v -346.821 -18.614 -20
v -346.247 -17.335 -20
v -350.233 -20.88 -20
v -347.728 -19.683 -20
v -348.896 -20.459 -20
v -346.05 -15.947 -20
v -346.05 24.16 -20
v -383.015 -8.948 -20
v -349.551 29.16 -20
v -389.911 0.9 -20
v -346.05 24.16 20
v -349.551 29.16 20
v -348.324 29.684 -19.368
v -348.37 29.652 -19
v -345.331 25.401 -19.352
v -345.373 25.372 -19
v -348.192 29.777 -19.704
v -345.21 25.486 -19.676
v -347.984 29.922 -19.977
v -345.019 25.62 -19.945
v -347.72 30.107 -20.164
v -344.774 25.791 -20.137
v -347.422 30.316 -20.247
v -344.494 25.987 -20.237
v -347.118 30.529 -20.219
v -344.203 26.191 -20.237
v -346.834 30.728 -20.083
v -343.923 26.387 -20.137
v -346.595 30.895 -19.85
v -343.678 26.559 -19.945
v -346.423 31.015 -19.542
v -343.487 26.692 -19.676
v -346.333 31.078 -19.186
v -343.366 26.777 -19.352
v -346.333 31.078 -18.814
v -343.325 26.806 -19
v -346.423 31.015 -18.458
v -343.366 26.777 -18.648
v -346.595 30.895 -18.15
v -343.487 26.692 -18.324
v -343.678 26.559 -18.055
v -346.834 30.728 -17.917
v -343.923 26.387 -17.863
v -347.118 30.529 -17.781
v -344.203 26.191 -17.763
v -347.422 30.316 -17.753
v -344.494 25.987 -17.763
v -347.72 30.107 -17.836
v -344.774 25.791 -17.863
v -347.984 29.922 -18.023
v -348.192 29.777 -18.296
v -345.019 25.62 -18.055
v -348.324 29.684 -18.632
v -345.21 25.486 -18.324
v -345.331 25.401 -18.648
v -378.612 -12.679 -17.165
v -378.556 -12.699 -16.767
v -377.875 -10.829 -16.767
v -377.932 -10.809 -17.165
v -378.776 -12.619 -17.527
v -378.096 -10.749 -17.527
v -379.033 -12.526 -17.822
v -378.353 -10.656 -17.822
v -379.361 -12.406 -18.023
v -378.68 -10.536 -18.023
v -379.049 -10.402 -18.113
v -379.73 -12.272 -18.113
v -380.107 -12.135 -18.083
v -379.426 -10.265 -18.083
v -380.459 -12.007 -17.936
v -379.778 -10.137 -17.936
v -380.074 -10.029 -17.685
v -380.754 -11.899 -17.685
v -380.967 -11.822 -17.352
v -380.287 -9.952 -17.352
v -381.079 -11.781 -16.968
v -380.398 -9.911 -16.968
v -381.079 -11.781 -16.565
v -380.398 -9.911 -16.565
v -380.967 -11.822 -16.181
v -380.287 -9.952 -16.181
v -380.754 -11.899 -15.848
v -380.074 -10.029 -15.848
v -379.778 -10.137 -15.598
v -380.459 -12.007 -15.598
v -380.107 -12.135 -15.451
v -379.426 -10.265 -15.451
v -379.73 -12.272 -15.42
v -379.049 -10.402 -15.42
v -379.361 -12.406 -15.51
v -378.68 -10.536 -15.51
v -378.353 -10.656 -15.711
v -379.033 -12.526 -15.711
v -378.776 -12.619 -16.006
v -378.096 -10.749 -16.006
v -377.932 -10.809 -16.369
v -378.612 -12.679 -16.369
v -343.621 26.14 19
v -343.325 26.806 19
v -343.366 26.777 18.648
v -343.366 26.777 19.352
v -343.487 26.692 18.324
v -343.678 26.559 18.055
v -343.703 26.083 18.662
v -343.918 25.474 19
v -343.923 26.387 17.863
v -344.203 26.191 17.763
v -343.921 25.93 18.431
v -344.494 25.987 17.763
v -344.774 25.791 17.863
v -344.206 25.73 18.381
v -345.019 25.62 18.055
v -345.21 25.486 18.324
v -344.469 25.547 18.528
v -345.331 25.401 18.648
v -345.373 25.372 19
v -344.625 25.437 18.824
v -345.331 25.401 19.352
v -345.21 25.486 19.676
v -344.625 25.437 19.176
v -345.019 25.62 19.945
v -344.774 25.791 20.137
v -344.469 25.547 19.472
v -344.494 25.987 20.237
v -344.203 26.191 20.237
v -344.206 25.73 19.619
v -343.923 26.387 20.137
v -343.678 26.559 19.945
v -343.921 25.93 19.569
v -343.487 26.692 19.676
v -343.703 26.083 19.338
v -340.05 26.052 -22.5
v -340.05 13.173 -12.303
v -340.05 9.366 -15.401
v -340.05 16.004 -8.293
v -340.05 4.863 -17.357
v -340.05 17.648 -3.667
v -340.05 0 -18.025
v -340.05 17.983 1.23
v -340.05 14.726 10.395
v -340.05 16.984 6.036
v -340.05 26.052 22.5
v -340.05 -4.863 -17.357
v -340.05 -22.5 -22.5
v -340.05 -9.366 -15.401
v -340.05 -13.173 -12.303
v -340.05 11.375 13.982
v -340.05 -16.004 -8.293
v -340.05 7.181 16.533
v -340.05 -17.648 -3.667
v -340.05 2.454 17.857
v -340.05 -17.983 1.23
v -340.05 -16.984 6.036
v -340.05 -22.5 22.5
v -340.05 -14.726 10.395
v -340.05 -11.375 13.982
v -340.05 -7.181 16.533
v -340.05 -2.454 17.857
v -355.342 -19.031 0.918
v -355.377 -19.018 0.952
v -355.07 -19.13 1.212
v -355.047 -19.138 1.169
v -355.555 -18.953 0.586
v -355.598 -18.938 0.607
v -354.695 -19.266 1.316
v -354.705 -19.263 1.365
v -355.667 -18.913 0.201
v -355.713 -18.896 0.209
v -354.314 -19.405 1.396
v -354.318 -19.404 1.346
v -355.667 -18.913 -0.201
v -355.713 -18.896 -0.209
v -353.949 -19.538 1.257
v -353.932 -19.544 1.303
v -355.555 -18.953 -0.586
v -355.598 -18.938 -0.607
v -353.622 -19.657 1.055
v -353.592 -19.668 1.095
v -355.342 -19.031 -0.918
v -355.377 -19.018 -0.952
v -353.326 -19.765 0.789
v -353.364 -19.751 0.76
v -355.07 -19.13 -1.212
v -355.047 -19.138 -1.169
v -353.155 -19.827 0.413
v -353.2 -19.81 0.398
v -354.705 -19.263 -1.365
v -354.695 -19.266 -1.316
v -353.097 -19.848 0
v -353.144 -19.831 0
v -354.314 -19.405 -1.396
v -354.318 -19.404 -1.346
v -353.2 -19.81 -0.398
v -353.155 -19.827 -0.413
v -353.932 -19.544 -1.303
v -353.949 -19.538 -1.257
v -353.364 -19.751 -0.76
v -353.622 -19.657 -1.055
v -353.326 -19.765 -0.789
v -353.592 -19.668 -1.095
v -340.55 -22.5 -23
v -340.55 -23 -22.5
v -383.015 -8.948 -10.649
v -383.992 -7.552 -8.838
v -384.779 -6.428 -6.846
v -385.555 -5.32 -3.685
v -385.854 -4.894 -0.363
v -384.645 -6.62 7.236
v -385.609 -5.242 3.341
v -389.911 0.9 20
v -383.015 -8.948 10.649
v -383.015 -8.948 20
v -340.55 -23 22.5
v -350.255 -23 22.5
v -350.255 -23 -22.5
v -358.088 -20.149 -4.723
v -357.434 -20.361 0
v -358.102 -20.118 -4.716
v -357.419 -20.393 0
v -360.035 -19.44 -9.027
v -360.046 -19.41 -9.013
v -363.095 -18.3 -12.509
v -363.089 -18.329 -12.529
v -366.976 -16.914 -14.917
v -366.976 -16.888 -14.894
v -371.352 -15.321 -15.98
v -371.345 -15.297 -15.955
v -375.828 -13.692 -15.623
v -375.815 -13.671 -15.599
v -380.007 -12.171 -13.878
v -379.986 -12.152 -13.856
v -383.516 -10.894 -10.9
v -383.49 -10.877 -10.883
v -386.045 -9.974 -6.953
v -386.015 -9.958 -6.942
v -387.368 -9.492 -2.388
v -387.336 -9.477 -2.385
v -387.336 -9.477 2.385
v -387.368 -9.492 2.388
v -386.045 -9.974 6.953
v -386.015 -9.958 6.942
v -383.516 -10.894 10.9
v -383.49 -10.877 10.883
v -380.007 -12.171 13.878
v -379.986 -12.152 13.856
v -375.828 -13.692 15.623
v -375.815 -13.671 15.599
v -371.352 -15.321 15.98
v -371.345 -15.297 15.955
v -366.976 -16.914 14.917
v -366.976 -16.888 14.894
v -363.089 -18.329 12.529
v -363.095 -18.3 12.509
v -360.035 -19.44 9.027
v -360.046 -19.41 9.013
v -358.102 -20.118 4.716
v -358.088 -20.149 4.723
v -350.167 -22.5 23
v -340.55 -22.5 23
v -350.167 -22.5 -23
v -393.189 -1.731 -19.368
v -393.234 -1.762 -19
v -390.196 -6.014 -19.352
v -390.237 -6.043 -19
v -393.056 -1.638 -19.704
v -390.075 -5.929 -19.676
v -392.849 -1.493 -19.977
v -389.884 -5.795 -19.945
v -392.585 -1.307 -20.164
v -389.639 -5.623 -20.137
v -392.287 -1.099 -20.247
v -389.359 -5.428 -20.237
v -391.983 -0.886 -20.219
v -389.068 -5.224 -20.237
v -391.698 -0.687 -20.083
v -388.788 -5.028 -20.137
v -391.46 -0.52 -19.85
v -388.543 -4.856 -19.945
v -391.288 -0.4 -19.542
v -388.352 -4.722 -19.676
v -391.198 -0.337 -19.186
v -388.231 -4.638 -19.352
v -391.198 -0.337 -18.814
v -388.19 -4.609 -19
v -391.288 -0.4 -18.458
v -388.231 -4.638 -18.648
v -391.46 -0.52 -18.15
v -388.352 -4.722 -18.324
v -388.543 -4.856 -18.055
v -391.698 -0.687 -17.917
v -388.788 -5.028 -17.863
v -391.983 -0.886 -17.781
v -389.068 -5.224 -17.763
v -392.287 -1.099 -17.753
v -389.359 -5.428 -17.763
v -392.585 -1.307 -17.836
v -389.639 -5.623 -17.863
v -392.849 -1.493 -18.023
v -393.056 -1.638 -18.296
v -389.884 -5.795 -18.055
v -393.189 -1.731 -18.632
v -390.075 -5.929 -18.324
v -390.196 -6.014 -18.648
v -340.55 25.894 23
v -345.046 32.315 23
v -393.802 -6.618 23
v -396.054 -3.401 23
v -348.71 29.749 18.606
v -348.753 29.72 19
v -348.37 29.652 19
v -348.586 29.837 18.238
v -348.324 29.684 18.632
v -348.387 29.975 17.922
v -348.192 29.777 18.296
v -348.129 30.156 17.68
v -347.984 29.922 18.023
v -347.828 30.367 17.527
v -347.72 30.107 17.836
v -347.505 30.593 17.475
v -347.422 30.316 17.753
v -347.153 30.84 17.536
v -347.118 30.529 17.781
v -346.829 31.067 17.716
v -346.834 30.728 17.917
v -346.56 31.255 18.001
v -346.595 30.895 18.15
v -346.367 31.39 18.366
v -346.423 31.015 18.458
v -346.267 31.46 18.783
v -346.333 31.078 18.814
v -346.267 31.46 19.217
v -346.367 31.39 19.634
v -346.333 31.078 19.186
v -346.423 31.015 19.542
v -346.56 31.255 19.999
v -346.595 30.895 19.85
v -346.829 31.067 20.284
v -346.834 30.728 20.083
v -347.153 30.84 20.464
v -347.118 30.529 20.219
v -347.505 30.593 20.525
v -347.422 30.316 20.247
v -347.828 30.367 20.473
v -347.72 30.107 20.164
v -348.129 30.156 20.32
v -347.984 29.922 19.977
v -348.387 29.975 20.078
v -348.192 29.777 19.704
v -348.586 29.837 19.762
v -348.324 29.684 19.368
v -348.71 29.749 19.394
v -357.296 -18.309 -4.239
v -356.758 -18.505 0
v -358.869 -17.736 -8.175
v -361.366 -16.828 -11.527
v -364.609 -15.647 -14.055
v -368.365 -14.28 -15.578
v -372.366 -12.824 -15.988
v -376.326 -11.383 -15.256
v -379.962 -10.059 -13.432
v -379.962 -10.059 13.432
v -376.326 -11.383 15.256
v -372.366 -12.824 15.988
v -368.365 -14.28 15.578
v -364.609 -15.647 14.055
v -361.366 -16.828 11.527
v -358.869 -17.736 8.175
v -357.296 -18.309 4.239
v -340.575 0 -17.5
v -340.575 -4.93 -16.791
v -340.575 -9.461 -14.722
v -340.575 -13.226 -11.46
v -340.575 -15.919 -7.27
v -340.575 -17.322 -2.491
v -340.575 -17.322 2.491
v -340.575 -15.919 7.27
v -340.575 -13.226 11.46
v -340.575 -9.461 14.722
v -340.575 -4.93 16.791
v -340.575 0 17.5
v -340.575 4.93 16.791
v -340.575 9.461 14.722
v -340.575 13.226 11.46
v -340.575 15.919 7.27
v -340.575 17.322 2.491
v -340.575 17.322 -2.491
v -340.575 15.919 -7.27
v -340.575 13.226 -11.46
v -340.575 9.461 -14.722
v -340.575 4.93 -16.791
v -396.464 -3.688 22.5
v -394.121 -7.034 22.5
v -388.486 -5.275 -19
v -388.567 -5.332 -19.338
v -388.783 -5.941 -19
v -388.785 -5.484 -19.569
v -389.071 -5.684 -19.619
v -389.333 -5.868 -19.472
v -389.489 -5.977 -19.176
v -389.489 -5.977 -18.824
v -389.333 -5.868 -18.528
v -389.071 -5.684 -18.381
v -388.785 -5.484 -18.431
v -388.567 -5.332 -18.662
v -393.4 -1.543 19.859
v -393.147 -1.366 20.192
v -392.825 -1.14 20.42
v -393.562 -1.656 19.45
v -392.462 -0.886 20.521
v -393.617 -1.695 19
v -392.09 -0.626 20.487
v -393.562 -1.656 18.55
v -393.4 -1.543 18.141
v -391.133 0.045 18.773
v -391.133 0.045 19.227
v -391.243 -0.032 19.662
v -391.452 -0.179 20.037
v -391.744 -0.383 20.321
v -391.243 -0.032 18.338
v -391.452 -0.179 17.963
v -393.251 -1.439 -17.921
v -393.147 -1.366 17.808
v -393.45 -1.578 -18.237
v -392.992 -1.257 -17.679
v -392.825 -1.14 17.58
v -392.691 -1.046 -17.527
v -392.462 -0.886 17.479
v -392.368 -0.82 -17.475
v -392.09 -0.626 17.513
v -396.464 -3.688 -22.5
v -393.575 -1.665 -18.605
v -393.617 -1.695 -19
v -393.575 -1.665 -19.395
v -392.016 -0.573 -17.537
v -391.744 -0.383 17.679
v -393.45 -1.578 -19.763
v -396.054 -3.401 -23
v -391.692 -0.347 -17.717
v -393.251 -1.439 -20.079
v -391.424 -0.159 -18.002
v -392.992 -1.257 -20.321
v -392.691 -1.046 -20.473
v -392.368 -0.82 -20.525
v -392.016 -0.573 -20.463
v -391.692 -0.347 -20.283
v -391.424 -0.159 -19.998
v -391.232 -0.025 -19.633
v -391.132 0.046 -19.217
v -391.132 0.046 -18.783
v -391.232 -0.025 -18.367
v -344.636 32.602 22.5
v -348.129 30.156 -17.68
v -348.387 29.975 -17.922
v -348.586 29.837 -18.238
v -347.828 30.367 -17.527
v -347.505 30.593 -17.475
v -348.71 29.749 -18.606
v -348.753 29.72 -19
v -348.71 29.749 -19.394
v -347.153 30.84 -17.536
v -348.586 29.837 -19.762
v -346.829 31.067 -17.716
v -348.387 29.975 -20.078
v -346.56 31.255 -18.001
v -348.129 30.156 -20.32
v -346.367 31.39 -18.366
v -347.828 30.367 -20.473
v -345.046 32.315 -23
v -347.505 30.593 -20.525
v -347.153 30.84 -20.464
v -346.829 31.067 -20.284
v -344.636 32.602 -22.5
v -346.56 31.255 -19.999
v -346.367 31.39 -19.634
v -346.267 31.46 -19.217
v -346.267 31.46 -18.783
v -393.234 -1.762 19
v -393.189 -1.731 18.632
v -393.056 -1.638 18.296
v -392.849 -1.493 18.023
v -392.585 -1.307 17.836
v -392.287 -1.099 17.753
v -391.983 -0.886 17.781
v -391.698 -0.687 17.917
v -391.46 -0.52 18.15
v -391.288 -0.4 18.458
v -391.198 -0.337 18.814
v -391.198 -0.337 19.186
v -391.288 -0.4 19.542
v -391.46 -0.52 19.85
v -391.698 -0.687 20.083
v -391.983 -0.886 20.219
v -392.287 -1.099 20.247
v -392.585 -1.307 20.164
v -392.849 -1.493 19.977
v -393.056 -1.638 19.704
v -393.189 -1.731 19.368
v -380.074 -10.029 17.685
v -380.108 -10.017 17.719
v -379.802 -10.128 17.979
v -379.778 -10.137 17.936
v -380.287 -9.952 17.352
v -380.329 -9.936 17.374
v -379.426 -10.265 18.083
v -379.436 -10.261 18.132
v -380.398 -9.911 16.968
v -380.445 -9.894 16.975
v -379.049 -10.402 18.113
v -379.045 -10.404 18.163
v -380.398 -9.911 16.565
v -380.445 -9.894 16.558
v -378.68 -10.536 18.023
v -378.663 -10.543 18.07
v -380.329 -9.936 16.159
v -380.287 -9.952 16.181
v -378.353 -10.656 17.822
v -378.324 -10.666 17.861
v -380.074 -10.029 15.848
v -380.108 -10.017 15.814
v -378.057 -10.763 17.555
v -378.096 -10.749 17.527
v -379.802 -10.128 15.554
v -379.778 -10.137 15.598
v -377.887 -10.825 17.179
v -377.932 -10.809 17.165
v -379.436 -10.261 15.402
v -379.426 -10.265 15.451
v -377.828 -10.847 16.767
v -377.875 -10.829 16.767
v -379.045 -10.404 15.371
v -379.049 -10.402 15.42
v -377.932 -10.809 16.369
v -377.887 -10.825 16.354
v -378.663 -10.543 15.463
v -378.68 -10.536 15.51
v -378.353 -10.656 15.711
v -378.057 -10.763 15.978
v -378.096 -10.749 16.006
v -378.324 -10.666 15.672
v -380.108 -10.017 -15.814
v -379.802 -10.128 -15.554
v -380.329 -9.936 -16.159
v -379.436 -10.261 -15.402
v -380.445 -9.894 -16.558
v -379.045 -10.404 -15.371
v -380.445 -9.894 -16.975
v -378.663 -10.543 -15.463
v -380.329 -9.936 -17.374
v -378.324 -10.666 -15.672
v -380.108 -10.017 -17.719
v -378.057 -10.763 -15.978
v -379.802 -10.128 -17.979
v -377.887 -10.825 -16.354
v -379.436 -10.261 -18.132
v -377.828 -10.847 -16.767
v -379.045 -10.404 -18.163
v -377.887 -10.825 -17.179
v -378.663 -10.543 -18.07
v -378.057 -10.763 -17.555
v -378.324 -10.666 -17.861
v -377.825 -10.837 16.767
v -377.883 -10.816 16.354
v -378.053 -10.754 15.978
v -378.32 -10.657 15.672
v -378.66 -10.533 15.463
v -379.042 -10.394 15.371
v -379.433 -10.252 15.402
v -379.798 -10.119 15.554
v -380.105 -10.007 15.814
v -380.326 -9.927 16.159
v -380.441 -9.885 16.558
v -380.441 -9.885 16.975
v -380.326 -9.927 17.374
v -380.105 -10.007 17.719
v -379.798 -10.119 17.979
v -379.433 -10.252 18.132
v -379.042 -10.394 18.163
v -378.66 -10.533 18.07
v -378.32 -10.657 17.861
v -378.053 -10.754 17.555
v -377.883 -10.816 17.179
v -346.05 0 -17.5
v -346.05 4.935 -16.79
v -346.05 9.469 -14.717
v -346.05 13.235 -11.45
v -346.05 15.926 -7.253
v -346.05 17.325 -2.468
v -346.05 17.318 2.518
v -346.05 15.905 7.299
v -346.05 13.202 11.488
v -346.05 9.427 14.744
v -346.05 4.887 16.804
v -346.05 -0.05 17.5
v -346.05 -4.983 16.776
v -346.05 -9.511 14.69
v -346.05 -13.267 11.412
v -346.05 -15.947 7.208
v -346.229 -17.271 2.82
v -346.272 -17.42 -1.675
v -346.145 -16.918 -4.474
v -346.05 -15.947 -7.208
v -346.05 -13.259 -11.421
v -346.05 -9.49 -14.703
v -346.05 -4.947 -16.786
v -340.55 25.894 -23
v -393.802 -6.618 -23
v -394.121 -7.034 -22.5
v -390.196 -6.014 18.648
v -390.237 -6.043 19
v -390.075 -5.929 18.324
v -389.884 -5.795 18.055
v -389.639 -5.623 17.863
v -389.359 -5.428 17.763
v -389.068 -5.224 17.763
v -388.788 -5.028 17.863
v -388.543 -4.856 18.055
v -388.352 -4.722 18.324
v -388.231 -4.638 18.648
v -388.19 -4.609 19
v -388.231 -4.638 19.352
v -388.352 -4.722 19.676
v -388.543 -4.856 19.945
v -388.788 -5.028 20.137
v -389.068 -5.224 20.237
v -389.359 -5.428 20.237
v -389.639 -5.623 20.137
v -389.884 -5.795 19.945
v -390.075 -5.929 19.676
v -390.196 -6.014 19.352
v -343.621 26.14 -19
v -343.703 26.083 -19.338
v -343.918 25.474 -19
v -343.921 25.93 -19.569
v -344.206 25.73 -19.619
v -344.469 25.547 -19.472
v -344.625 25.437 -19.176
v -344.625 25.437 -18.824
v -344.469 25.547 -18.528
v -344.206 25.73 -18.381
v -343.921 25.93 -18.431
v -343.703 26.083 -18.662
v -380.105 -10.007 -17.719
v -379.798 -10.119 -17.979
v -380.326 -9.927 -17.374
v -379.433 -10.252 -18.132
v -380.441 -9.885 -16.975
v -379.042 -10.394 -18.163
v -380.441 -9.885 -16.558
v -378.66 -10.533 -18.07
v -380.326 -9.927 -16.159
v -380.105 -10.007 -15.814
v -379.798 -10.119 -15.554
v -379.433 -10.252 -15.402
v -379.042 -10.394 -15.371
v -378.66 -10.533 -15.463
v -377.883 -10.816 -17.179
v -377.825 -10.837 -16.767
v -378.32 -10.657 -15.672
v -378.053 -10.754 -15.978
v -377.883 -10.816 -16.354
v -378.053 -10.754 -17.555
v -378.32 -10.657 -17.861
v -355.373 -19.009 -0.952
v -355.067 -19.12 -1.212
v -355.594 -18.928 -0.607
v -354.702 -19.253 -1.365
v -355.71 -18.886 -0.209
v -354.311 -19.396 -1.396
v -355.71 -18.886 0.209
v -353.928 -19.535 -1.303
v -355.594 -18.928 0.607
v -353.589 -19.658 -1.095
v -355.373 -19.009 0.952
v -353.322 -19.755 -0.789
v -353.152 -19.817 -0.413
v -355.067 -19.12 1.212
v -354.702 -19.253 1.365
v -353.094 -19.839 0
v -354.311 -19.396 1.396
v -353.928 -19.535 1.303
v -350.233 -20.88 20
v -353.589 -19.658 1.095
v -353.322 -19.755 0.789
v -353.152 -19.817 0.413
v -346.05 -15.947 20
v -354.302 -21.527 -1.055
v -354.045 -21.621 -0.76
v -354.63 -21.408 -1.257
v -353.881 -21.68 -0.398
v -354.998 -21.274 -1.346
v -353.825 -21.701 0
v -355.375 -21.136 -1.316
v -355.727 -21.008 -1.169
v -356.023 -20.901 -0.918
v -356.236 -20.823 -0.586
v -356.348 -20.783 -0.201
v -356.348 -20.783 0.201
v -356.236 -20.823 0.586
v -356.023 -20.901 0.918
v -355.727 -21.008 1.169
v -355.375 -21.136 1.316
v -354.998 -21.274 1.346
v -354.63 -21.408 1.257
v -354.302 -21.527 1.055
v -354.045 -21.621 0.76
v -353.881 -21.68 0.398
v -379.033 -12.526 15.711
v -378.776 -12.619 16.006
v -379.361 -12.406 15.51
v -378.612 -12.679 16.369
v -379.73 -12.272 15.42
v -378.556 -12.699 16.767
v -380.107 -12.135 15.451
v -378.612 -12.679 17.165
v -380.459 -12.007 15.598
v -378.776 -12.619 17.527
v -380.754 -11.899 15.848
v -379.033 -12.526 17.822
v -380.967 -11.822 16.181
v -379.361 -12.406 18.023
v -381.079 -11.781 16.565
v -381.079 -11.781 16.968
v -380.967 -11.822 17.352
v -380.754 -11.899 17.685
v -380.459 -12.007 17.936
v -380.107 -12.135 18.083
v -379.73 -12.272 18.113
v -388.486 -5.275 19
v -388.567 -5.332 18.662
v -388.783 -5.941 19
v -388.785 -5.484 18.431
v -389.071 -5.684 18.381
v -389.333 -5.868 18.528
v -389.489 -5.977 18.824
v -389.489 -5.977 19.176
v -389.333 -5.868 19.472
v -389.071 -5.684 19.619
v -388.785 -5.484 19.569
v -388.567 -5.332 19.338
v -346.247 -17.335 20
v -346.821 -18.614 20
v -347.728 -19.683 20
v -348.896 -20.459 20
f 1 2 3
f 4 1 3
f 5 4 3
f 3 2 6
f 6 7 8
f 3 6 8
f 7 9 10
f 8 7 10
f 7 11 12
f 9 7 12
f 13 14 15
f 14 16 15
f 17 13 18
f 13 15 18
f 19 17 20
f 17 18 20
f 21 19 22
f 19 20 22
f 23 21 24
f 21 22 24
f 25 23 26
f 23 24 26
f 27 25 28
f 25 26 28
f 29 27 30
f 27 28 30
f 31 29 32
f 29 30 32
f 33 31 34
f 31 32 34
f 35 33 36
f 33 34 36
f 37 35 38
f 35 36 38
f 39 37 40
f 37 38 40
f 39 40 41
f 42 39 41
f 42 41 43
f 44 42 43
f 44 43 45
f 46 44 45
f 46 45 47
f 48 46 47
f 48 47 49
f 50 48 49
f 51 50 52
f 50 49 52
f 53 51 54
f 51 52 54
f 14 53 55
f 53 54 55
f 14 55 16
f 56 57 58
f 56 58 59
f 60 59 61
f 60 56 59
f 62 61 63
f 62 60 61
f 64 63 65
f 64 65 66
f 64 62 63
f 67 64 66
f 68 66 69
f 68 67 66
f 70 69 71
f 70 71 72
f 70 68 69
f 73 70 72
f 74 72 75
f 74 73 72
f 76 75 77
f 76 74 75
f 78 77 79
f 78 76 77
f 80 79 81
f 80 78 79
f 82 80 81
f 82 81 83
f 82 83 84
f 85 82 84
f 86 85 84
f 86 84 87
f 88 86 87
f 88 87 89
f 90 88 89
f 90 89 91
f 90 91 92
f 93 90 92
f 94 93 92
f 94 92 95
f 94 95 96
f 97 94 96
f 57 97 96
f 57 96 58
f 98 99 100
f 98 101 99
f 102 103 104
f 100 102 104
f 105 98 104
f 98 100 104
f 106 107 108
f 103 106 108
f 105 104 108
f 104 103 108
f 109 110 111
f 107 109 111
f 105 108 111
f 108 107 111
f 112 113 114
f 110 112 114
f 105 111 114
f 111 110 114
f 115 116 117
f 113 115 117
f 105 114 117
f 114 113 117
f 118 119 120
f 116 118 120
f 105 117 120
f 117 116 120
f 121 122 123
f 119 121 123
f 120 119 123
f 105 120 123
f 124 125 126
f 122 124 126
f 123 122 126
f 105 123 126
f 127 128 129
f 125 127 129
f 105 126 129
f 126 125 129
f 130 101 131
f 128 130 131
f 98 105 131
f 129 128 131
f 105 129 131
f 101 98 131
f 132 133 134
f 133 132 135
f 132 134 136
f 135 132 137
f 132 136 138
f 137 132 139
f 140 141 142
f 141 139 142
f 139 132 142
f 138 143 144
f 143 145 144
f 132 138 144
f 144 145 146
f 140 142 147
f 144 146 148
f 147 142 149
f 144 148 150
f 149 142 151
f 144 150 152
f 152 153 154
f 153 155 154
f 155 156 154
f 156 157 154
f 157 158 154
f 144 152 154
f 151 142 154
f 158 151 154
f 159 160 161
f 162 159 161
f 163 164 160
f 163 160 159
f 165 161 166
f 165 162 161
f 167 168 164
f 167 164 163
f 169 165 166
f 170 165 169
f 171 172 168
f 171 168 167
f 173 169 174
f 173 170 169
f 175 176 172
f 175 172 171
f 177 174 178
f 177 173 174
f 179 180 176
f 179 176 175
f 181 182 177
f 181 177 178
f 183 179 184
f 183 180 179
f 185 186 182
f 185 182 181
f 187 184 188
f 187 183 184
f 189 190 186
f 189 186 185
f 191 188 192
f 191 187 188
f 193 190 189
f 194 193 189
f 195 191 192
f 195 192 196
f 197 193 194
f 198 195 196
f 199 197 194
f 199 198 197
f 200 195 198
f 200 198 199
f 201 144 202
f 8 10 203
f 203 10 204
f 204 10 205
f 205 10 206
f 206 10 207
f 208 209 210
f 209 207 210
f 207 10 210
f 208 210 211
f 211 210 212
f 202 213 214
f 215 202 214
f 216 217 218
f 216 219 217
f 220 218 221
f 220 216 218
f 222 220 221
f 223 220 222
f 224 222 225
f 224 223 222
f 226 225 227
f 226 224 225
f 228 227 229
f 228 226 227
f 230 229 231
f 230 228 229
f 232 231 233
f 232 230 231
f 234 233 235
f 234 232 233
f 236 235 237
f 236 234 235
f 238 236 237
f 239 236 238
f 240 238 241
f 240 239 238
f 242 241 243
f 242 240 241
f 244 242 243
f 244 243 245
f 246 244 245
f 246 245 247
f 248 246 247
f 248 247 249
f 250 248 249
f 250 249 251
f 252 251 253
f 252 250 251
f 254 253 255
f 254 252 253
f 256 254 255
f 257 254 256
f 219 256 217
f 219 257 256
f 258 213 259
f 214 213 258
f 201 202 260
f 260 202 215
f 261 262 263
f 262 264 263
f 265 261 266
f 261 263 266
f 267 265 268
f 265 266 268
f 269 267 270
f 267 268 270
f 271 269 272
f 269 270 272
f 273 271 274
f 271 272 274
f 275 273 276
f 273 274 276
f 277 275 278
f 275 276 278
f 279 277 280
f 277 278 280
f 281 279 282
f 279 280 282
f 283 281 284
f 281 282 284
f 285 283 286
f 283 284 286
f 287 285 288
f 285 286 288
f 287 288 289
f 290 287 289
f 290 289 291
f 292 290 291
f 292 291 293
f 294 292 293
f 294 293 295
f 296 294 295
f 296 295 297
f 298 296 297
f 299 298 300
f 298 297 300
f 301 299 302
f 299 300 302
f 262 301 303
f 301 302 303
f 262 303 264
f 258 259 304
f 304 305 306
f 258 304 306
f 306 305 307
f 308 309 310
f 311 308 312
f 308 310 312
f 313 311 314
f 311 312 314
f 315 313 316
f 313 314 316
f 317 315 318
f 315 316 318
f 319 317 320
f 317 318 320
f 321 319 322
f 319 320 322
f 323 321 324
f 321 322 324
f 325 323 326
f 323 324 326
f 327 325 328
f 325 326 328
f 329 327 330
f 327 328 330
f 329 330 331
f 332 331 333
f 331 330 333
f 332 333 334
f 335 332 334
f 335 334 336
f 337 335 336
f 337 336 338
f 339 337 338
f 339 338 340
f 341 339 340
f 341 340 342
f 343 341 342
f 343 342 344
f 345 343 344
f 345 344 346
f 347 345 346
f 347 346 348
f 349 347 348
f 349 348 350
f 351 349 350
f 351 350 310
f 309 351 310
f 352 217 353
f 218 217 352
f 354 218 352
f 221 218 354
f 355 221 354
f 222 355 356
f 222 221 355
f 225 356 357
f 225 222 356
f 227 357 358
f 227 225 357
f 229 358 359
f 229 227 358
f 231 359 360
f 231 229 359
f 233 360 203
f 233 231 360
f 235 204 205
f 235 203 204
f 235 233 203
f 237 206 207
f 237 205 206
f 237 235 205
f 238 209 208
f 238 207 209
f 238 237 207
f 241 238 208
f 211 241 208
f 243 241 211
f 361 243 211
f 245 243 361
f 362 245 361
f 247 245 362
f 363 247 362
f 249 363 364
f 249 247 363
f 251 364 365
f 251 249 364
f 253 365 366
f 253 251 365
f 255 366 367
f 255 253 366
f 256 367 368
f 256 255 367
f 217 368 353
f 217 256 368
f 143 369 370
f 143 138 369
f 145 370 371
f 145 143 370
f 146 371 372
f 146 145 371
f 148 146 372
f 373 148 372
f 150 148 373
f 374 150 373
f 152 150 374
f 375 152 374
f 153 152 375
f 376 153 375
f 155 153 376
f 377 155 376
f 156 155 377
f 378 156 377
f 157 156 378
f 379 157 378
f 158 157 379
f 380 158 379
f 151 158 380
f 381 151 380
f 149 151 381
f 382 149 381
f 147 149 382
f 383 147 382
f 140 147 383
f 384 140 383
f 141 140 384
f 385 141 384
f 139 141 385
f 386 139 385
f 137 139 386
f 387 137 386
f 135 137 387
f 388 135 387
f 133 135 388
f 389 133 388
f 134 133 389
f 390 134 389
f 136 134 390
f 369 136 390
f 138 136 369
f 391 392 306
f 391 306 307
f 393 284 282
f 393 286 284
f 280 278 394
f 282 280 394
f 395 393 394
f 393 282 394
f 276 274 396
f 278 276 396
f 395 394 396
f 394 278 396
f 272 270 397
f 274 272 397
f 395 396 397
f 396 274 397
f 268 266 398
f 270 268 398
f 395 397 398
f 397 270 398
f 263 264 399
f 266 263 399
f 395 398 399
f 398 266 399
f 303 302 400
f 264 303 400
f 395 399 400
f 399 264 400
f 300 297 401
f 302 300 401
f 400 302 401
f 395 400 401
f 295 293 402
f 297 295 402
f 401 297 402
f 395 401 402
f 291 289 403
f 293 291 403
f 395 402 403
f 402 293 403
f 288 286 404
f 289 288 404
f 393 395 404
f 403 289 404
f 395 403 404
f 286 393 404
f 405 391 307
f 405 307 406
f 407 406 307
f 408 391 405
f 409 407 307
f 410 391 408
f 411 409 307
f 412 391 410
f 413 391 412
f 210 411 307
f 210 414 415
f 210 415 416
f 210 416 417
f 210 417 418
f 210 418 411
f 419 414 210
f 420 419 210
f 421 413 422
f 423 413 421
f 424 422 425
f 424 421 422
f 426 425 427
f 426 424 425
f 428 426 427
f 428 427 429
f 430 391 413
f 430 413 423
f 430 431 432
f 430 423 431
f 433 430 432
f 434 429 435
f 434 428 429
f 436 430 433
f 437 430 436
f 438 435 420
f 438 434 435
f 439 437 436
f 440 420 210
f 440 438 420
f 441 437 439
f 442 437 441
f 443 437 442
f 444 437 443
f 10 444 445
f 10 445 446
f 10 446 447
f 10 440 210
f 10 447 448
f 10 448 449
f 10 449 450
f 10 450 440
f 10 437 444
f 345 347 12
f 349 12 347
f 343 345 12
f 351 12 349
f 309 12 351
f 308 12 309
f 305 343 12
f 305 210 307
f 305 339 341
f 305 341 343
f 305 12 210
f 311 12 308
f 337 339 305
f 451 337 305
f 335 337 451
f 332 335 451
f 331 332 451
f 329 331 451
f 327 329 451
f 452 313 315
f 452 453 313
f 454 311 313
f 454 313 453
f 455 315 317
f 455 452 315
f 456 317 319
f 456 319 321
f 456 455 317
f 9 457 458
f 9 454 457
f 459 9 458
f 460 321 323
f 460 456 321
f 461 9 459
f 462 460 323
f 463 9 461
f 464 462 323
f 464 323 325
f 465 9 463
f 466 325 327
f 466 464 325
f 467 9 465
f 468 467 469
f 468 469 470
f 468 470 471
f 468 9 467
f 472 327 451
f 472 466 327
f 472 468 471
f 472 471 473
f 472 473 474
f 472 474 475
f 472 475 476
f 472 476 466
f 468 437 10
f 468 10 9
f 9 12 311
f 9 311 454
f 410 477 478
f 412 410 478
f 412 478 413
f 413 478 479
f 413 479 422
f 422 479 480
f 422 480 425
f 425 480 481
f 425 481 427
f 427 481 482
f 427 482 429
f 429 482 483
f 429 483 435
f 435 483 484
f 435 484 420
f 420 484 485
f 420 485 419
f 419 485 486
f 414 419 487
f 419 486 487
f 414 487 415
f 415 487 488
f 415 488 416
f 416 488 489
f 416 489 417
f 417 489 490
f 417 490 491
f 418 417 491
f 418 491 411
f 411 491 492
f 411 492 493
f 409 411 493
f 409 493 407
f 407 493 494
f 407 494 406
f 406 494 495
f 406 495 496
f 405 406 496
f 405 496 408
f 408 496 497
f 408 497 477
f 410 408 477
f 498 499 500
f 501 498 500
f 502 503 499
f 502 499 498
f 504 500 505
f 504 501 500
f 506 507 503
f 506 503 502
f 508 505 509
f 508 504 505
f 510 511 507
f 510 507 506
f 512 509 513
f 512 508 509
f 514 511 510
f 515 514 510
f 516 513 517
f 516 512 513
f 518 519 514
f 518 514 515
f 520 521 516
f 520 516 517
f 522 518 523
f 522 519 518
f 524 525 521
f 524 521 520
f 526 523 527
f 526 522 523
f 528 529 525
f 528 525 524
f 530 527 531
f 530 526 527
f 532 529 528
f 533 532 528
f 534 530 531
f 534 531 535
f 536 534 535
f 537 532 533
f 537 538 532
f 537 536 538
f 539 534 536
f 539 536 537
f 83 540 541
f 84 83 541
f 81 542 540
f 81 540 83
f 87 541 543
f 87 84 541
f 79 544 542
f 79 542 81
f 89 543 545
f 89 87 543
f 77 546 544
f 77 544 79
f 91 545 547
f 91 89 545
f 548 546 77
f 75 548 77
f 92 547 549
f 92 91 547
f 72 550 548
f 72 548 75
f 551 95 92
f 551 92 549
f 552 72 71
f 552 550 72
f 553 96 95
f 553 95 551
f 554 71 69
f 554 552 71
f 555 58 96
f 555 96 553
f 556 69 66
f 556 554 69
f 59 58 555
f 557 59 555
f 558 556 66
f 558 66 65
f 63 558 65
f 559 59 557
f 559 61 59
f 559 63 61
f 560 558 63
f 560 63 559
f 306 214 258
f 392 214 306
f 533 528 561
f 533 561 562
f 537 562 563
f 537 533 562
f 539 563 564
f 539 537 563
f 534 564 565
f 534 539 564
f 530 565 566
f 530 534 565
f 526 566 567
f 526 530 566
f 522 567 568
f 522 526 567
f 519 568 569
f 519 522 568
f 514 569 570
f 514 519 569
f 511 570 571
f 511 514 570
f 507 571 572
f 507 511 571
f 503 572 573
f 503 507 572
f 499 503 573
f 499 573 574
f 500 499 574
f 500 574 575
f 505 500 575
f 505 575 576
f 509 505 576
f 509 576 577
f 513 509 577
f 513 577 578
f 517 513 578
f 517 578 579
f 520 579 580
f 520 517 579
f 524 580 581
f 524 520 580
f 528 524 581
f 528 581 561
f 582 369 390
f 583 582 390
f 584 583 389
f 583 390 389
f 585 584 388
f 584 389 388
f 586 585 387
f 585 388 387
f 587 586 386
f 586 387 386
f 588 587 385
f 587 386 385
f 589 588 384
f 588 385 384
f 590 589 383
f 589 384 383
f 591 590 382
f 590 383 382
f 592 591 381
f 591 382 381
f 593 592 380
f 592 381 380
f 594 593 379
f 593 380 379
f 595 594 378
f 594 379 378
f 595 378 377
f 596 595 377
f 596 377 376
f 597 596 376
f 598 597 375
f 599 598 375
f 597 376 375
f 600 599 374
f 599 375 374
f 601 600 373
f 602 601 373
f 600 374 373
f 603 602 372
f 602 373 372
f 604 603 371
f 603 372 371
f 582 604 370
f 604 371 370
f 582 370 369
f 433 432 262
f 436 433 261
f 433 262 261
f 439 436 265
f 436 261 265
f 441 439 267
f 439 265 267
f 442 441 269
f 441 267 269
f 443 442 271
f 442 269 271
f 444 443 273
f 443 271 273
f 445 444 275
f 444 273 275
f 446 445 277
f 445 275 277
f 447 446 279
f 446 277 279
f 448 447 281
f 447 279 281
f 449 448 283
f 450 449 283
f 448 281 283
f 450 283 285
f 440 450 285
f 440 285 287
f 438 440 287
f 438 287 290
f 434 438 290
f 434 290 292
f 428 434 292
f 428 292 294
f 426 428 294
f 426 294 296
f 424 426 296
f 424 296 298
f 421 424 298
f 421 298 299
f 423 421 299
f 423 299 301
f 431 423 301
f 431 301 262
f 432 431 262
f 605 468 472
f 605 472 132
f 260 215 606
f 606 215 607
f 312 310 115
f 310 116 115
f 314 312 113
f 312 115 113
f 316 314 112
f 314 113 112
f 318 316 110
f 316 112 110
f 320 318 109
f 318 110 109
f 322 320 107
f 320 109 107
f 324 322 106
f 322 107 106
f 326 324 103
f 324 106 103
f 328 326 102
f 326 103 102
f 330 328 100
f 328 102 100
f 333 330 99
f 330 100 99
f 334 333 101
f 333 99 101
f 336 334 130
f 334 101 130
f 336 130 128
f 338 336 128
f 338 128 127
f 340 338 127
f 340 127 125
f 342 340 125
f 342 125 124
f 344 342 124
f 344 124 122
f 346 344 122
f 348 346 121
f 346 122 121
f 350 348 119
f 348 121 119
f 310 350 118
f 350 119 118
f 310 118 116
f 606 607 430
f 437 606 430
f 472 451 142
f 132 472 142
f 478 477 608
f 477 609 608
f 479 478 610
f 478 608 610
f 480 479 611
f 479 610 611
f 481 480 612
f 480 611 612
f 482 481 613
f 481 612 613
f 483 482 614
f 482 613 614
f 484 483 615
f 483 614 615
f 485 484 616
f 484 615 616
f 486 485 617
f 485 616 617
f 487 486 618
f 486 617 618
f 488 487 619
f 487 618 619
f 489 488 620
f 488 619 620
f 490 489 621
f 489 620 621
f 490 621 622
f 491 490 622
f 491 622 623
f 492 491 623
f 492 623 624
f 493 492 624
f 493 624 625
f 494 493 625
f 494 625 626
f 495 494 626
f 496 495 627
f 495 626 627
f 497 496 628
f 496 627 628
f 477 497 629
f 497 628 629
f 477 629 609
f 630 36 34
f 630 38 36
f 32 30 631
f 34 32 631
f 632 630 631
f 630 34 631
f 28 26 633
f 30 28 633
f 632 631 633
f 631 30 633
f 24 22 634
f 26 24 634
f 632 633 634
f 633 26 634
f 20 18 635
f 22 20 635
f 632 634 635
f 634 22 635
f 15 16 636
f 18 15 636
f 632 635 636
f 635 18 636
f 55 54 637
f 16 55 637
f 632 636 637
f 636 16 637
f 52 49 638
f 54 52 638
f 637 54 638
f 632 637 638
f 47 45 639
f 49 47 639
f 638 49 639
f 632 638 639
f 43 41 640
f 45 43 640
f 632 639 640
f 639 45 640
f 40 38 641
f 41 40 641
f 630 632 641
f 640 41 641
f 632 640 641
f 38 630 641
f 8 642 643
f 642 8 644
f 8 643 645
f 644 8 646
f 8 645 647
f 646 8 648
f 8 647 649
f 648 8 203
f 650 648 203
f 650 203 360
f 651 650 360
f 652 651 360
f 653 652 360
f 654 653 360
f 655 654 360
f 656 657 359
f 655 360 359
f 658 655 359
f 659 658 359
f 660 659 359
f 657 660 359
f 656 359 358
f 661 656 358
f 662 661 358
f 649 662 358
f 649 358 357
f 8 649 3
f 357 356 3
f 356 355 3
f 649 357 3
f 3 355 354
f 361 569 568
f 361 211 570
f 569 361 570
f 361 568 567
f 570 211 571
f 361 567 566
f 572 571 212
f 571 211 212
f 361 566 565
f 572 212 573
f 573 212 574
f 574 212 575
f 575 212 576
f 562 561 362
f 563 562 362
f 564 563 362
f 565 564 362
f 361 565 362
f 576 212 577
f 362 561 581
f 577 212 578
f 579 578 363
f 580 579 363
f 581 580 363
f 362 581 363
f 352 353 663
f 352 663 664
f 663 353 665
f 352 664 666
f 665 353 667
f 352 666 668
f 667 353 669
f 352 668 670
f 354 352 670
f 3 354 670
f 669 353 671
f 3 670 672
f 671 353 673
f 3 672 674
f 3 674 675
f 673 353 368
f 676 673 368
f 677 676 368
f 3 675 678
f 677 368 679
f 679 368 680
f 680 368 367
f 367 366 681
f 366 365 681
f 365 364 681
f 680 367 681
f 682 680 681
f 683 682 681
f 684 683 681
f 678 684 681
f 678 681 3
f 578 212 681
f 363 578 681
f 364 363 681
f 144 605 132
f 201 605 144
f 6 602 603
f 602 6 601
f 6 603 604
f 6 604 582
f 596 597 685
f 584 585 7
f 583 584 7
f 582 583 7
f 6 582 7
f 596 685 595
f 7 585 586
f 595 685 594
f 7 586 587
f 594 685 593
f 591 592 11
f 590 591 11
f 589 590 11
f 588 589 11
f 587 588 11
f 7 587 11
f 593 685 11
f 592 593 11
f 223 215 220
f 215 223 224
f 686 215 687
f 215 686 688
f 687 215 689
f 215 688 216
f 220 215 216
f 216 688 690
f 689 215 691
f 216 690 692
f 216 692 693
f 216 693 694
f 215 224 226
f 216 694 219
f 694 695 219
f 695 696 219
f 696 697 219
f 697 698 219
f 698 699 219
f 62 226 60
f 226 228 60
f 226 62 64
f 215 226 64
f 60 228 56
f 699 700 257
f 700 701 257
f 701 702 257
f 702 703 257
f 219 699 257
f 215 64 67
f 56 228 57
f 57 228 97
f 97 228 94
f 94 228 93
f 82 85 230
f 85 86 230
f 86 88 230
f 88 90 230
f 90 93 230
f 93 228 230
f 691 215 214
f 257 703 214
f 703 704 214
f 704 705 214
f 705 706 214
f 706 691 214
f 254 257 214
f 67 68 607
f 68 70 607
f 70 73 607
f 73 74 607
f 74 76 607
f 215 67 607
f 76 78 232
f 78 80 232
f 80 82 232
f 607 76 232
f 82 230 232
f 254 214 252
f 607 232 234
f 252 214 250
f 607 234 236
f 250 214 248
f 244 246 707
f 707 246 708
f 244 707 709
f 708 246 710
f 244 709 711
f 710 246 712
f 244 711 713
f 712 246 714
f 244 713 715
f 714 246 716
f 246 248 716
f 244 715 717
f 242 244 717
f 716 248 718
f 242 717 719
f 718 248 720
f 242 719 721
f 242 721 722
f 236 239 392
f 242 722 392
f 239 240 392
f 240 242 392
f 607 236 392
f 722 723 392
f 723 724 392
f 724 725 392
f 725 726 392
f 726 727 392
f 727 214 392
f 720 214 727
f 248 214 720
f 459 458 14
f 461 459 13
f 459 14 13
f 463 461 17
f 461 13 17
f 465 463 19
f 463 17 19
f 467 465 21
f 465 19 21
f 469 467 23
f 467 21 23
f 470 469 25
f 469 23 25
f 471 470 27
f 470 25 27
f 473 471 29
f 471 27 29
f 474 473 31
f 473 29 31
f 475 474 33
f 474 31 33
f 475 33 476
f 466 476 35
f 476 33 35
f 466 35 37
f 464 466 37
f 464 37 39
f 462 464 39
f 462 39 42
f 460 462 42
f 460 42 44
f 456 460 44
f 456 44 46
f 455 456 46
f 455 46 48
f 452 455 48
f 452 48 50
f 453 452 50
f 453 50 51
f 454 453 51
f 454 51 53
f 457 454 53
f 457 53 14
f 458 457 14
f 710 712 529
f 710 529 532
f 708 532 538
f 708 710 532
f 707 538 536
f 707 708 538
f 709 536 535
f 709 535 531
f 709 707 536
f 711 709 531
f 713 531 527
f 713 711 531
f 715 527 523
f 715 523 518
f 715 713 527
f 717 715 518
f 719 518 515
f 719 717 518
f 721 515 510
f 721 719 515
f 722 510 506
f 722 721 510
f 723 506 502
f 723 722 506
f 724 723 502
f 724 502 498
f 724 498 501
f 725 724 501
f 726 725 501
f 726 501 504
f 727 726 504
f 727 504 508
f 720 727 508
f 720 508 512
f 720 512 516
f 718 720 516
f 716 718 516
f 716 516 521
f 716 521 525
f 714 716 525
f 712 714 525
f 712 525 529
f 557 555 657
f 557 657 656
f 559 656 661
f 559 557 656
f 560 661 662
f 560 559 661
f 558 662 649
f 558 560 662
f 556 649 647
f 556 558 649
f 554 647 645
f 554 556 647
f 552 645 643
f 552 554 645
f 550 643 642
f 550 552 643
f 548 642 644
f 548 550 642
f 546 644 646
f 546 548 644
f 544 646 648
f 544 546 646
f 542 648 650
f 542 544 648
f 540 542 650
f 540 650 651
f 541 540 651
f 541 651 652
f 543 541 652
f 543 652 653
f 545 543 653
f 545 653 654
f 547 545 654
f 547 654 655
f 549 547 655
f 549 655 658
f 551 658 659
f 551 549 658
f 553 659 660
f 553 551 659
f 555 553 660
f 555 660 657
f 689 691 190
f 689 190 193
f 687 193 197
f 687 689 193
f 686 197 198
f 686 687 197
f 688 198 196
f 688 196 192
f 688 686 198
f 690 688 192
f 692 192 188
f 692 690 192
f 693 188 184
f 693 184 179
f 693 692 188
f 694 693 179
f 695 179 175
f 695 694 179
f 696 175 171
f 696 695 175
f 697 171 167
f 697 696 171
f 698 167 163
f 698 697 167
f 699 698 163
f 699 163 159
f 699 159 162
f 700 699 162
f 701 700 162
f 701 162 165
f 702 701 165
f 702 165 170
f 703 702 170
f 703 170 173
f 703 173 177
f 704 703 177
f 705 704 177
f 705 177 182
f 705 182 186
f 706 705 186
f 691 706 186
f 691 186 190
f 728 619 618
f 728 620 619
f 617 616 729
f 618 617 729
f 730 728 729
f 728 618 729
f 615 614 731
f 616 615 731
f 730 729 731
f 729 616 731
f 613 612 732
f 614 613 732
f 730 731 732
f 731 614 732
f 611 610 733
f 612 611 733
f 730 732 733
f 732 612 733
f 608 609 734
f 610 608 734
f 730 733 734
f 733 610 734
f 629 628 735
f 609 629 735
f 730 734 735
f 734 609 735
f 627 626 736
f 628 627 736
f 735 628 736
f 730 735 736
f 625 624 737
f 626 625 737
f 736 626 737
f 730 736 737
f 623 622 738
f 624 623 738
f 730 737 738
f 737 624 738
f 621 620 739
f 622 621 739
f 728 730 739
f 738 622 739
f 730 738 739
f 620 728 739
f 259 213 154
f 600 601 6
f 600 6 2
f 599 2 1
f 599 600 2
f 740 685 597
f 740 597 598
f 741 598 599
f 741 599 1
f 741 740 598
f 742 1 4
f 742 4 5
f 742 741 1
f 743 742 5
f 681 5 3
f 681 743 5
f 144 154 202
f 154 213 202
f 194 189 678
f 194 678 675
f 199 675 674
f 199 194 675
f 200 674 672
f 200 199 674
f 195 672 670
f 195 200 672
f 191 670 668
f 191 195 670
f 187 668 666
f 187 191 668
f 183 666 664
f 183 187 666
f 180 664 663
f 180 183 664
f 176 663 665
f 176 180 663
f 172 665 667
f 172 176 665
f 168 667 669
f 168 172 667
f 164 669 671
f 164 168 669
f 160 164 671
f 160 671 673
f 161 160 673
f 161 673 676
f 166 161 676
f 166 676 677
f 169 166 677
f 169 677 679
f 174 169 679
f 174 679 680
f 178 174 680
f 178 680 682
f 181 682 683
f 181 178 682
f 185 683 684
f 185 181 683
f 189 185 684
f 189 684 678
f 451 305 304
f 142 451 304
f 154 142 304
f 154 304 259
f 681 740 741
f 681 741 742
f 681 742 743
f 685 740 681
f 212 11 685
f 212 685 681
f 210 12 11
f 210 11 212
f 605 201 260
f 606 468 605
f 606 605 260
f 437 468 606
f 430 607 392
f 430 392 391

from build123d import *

# Parameters (mm, degrees)
P_IDAT_VYSUNUT_M1_DEPTH                     = 20
P_IDAT_VYSUNUT_M2_DEPTH                     = 3
V_LCOV_START                                = -141.407290306
V_LCOV_ZAHLOUBEN_PRO_M2_5_ROUBY_S_2_R       = 1.35
V_LCOV_ZAHLOUBEN_PRO_M2_5_ROUBY_S_VNI_DEPTH = 2
V_LCOV_START_2                              = -139.417290306
V_LCOV_ZAHLOUBEN_PRO_M2_5_ROUBY_S_3_O_R     = 1.4
V_LCOV_ZAHLOUBEN_PRO_M2_5_ROUBY_S_3_O_R_2   = 1.35
V_LCOV_ZAHLOUBEN_PRO_M2_5_ROUBY_S_3_DEPTH   = 0.01
SKICA13_W                                   = 63.2698
SKICA13_H                                   = 46
SKICA13_W_2                                 = 49.2698
SKICA13_H_2                                 = 40
ODEBRAT_VYSUNUT_M1_DEPTH                    = 3
M3_Z_VIT2_D                                 = 2.5
M3_Z_VIT2_DEPTH                             = 5.5
M3_Z_VIT2_CSINK_D                           = 3.05
M3_Z_VIT2_CSINK_ANGLE                       = 90
M3_Z_VIT2_TIP                               = 0.751075774
M3_Z_VIT2_ON_FACE_2_D                       = 2.5
M3_Z_VIT2_ON_FACE_2_DEPTH                   = 5.5
M3_Z_VIT2_ON_FACE_2_CSINK_D                 = 3.05
M3_Z_VIT2_ON_FACE_2_CSINK_ANGLE             = 90
M3_Z_VIT2_ON_FACE_2_TIP                     = 0.751075774
M3_Z_VIT2_ON_FACE_3_D                       = 2.5
M3_Z_VIT2_ON_FACE_3_DEPTH                   = 5.5
M3_Z_VIT2_ON_FACE_3_CSINK_D                 = 3.05
M3_Z_VIT2_ON_FACE_3_CSINK_ANGLE             = 90
M3_Z_VIT2_ON_FACE_3_TIP                     = 0.751075774
ZKOSEN_1_SIZE                               = 0.5
ZAOBLIT1_R                                  = 5


# Read off the part's stored shape, not the designer's step: Válcové zahloubení pro M2.5 šrouby s vnitřním šestihranem1
with BuildPart() as part:
    # Skica2 → Přidat vysunutím1 (new, symmetric)
    with BuildSketch(Plane.XY):
        Polygon((-340.05, -23), (-350.255276964, -23), (-394.120989631, -7.034186284), (-398.184656118, -1.23066909), (-391.631439764, 3.357942401), (-383.014556922, -8.948241654), (-350.233285651, -20.879648638), (-346.05, -20.879648638), (-346.05, 24.160174988), (-351.271982372, 31.617938704), (-346.357070106, 35.059397322), (-340.05, 26.051967722), align=None)
    extrude(amount=P_IDAT_VYSUNUT_M1_DEPTH, both=True)

    # Skica3 → Přidat vysunutím2 (add)
    with BuildSketch(Plane.XY.offset(20)):
        Polygon((-346.357070106, 35.059397322), (-340.05, 26.051967722), (-340.05, -23), (-350.255276964, -23), (-394.120989631, -7.034186284), (-398.184656118, -1.23066909), align=None)
    p_idat_vysunut_m2 = extrude(amount=P_IDAT_VYSUNUT_M2_DEPTH)

    # Zrcadlit1: Přidat vysunutím2 across plane
    add(p_idat_vysunut_m2.mirror(Plane.XY))

    # Skica6 → M36x1.0 závit1 (revolve, cut)
    with BuildSketch(Plane(origin=(-340.05, 0, 0), x_dir=(0, 0, -1), z_dir=(0, 1, 0))):
        Polygon((0, 0), (0, 6), (17.5, 6), (17.5, 0.525), (18.025, 0), align=None)
    revolve(axis=Axis((-333.7, 0, 0), (-1, 0, 0)), mode=Mode.SUBTRACT)

    # Skica8 → Ø32.0 (32) průměr díry1 (revolve, cut)
    with BuildSketch(Plane(origin=(-372.477448122, -14.911791158, 0), x_dir=(0.9396926207859314, -0.34202014332560576, 0), z_dir=(0, 0, 1))):
        Polygon((0, 0), (0, 15.613769904), (16, 6), (16, 0.025), (16.025, 0), align=None)
    revolve(axis=Axis((-374.649276032, -20.8788393, 0), (0.3420201433256057, 0.9396926207859314, 0)), mode=Mode.SUBTRACT)

    # V_lcov_ zahlouben_ pro M2.5 _rouby s 2 → Válcové zahloubení pro M2.5 šrouby s vnitřním šestihranem1 (cut)
    with BuildSketch(Plane(origin=(0, 0, 0), x_dir=(0.9396926207859079, -0.34202014332566993, 0), z_dir=(0.34202014332567, 0.939692620785908, 0)).offset(V_LCOV_START)):
        with Locations((-352.732614303, 16.76669406)):
            Circle(V_LCOV_ZAHLOUBEN_PRO_M2_5_ROUBY_S_2_R)
        with Locations((-352.732614303, -16.76669406)):
            Circle(V_LCOV_ZAHLOUBEN_PRO_M2_5_ROUBY_S_2_R)
        with Locations((-326.41417646, 0)):
            Circle(V_LCOV_ZAHLOUBEN_PRO_M2_5_ROUBY_S_2_R)
    extrude(amount=V_LCOV_ZAHLOUBEN_PRO_M2_5_ROUBY_S_VNI_DEPTH, mode=Mode.SUBTRACT)

    # V_lcov_ zahlouben_ pro M2.5 _rouby s 3 o → V_lcov_ zahlouben_ pro M2.5 _rouby s 3 (cut)
    # profile 1 of 3: a face of its own
    with BuildSketch(Plane(origin=(0, 0, 0), x_dir=(0.9396926207859079, -0.34202014332566993, 0), z_dir=(0.34202014332567, 0.939692620785908, 0)).offset(V_LCOV_START_2)):
        with Locations((-352.732614303, 16.76669406)):
            Circle(V_LCOV_ZAHLOUBEN_PRO_M2_5_ROUBY_S_3_O_R)
        with Locations((-352.732614303, 16.76669406)):
            Circle(V_LCOV_ZAHLOUBEN_PRO_M2_5_ROUBY_S_3_O_R_2, mode=Mode.SUBTRACT)
    # profile 2 of 3: a face of its own
    with BuildSketch(Plane(origin=(0, 0, 0), x_dir=(0.9396926207859079, -0.34202014332566993, 0), z_dir=(0.34202014332567, 0.939692620785908, 0)).offset(V_LCOV_START_2)):
        with Locations((-352.732614303, -16.76669406)):
            Circle(V_LCOV_ZAHLOUBEN_PRO_M2_5_ROUBY_S_3_O_R)
        with Locations((-352.732614303, -16.76669406)):
            Circle(V_LCOV_ZAHLOUBEN_PRO_M2_5_ROUBY_S_3_O_R_2, mode=Mode.SUBTRACT)
    # profile 3 of 3: a face of its own
    with BuildSketch(Plane(origin=(0, 0, 0), x_dir=(0.9396926207859079, -0.34202014332566993, 0), z_dir=(0.34202014332567, 0.939692620785908, 0)).offset(V_LCOV_START_2)):
        with Locations((-326.41417646, 0)):
            Circle(V_LCOV_ZAHLOUBEN_PRO_M2_5_ROUBY_S_3_O_R)
        with Locations((-326.41417646, 0)):
            Circle(V_LCOV_ZAHLOUBEN_PRO_M2_5_ROUBY_S_3_O_R_2, mode=Mode.SUBTRACT)
    extrude(amount=V_LCOV_ZAHLOUBEN_PRO_M2_5_ROUBY_S_3_DEPTH, mode=Mode.SUBTRACT)

    # Skica13 → Odebrat vysunutím1 (cut)
    with BuildSketch(Plane(origin=(-130.42051615, 186.259800178, 0), x_dir=(0.8191520442889952, 0.5735764363510412, 0), z_dir=(-0.5735764363510412, 0.8191520442889952, 0))):
        with Locations((-295.244757855, 0)):
            Rectangle(SKICA13_W, SKICA13_H)
        with Locations((-294.244757855, 0)):
            Rectangle(SKICA13_W_2, SKICA13_H_2, mode=Mode.SUBTRACT)
    extrude(amount=-ODEBRAT_VYSUNUT_M1_DEPTH, mode=Mode.SUBTRACT)

    # M3 závit2
    with Locations(Plane(origin=(-392.368166588, -0.820243041, 19), x_dir=(0.819152044289, 0.573576436351, 0), z_dir=(-0.573576436351, 0.819152044289, 0))):
        with Locations((0, 0)):
            CounterSinkHole(M3_Z_VIT2_D / 2, M3_Z_VIT2_CSINK_D / 2, depth=M3_Z_VIT2_DEPTH, counter_sink_angle=M3_Z_VIT2_CSINK_ANGLE)
            with Locations((0, 0, -(M3_Z_VIT2_DEPTH + M3_Z_VIT2_TIP / 2))):  # 118° drill point
                Cone(0, M3_Z_VIT2_D / 2, M3_Z_VIT2_TIP, mode=Mode.SUBTRACT)

    # M3 závit2 on face 2
    with Locations(Plane(origin=(-347.503372952, 30.594423662, -19), x_dir=(0.819152234736, 0.573576164364, 0), z_dir=(-0.573576164364, 0.819152234736, 0))):
        with Locations((0, 0), (0, -38)):
            CounterSinkHole(M3_Z_VIT2_ON_FACE_2_D / 2, M3_Z_VIT2_ON_FACE_2_CSINK_D / 2, depth=M3_Z_VIT2_ON_FACE_2_DEPTH, counter_sink_angle=M3_Z_VIT2_ON_FACE_2_CSINK_ANGLE)
            with Locations((0, 0, -(M3_Z_VIT2_ON_FACE_2_DEPTH + M3_Z_VIT2_ON_FACE_2_TIP / 2))):  # 118° drill point
                Cone(0, M3_Z_VIT2_ON_FACE_2_D / 2, M3_Z_VIT2_ON_FACE_2_TIP, mode=Mode.SUBTRACT)

    # M3 závit2 on face 3
    with Locations(Plane(origin=(-392.368166588, -0.820243041, -19), x_dir=(0.819152234736, 0.573576164364, 0), z_dir=(-0.573576164364, 0.819152234736, 0))):
        with Locations((0, 0)):
            CounterSinkHole(M3_Z_VIT2_ON_FACE_3_D / 2, M3_Z_VIT2_ON_FACE_3_CSINK_D / 2, depth=M3_Z_VIT2_ON_FACE_3_DEPTH, counter_sink_angle=M3_Z_VIT2_ON_FACE_3_CSINK_ANGLE)
            with Locations((0, 0, -(M3_Z_VIT2_ON_FACE_3_DEPTH + M3_Z_VIT2_ON_FACE_3_TIP / 2))):  # 118° drill point
                Cone(0, M3_Z_VIT2_ON_FACE_3_D / 2, M3_Z_VIT2_ON_FACE_3_TIP, mode=Mode.SUBTRACT)

    # Zkosení1
    zkosen_1_edges = [part.edges().sort_by_distance(p)[0] for p in [
        (-342.343170399, 29.326954456, -23),
        (-342.343170399, 29.326954456, 23),
        (-340.05, -23, 0),
        (-395.29245822, -5.361155754, 23),
        (-372.188133297, -15.017093142, 23),
        (-345.152638482, -23, 23),
        (-340.05, 1.525983861, 23),
        (-395.29245822, -5.361155754, -23),
        (-340.05, 1.525983861, -23),
        (-345.152638482, -23, -23),
        (-372.188133297, -15.017093142, -23),
    ]]
    chamfer(zkosen_1_edges, length=ZKOSEN_1_SIZE)

    # Zaoblit1
    # the kernel refuses this fillet: 5 mm, written as the material it adds along each edge
    with BuildSketch(Plane(origin=(-346.05, -20.879648638, 20), x_dir=(-1, 0, 0), z_dir=(0, 0, -1))) as zaoblit1_piece_1_section:
        with BuildLine():
            CenterArc((5, 4.932846812), ZAOBLIT1_R, 180, 80.599018085)
            Line((0, 4.932846812), (-0.1, 4.932846812))
            Line((-0.1, 4.932846812), (-0.1, 0))
            Line((-0.1, 0), (0, -0.1))
            ThreePointArc((0, -0.1), (2.091642826, -0.1), (4.166951364, -0.098656936))
            Line((4.166951364, -0.098656936), (4.183285651, 0))
        make_face()
    zaoblit1_piece_1 = extrude(amount=40, mode=Mode.PRIVATE)
    zaoblit1_piece_1 = zaoblit1_piece_1 - Plane(origin=(-347.091511424, 0, 0), x_dir=(0, 0, -1), z_dir=(1, 0, 0)) * Cylinder(17.5, 100, mode=Mode.PRIVATE)
    add(zaoblit1_piece_1)


solid = part.part
